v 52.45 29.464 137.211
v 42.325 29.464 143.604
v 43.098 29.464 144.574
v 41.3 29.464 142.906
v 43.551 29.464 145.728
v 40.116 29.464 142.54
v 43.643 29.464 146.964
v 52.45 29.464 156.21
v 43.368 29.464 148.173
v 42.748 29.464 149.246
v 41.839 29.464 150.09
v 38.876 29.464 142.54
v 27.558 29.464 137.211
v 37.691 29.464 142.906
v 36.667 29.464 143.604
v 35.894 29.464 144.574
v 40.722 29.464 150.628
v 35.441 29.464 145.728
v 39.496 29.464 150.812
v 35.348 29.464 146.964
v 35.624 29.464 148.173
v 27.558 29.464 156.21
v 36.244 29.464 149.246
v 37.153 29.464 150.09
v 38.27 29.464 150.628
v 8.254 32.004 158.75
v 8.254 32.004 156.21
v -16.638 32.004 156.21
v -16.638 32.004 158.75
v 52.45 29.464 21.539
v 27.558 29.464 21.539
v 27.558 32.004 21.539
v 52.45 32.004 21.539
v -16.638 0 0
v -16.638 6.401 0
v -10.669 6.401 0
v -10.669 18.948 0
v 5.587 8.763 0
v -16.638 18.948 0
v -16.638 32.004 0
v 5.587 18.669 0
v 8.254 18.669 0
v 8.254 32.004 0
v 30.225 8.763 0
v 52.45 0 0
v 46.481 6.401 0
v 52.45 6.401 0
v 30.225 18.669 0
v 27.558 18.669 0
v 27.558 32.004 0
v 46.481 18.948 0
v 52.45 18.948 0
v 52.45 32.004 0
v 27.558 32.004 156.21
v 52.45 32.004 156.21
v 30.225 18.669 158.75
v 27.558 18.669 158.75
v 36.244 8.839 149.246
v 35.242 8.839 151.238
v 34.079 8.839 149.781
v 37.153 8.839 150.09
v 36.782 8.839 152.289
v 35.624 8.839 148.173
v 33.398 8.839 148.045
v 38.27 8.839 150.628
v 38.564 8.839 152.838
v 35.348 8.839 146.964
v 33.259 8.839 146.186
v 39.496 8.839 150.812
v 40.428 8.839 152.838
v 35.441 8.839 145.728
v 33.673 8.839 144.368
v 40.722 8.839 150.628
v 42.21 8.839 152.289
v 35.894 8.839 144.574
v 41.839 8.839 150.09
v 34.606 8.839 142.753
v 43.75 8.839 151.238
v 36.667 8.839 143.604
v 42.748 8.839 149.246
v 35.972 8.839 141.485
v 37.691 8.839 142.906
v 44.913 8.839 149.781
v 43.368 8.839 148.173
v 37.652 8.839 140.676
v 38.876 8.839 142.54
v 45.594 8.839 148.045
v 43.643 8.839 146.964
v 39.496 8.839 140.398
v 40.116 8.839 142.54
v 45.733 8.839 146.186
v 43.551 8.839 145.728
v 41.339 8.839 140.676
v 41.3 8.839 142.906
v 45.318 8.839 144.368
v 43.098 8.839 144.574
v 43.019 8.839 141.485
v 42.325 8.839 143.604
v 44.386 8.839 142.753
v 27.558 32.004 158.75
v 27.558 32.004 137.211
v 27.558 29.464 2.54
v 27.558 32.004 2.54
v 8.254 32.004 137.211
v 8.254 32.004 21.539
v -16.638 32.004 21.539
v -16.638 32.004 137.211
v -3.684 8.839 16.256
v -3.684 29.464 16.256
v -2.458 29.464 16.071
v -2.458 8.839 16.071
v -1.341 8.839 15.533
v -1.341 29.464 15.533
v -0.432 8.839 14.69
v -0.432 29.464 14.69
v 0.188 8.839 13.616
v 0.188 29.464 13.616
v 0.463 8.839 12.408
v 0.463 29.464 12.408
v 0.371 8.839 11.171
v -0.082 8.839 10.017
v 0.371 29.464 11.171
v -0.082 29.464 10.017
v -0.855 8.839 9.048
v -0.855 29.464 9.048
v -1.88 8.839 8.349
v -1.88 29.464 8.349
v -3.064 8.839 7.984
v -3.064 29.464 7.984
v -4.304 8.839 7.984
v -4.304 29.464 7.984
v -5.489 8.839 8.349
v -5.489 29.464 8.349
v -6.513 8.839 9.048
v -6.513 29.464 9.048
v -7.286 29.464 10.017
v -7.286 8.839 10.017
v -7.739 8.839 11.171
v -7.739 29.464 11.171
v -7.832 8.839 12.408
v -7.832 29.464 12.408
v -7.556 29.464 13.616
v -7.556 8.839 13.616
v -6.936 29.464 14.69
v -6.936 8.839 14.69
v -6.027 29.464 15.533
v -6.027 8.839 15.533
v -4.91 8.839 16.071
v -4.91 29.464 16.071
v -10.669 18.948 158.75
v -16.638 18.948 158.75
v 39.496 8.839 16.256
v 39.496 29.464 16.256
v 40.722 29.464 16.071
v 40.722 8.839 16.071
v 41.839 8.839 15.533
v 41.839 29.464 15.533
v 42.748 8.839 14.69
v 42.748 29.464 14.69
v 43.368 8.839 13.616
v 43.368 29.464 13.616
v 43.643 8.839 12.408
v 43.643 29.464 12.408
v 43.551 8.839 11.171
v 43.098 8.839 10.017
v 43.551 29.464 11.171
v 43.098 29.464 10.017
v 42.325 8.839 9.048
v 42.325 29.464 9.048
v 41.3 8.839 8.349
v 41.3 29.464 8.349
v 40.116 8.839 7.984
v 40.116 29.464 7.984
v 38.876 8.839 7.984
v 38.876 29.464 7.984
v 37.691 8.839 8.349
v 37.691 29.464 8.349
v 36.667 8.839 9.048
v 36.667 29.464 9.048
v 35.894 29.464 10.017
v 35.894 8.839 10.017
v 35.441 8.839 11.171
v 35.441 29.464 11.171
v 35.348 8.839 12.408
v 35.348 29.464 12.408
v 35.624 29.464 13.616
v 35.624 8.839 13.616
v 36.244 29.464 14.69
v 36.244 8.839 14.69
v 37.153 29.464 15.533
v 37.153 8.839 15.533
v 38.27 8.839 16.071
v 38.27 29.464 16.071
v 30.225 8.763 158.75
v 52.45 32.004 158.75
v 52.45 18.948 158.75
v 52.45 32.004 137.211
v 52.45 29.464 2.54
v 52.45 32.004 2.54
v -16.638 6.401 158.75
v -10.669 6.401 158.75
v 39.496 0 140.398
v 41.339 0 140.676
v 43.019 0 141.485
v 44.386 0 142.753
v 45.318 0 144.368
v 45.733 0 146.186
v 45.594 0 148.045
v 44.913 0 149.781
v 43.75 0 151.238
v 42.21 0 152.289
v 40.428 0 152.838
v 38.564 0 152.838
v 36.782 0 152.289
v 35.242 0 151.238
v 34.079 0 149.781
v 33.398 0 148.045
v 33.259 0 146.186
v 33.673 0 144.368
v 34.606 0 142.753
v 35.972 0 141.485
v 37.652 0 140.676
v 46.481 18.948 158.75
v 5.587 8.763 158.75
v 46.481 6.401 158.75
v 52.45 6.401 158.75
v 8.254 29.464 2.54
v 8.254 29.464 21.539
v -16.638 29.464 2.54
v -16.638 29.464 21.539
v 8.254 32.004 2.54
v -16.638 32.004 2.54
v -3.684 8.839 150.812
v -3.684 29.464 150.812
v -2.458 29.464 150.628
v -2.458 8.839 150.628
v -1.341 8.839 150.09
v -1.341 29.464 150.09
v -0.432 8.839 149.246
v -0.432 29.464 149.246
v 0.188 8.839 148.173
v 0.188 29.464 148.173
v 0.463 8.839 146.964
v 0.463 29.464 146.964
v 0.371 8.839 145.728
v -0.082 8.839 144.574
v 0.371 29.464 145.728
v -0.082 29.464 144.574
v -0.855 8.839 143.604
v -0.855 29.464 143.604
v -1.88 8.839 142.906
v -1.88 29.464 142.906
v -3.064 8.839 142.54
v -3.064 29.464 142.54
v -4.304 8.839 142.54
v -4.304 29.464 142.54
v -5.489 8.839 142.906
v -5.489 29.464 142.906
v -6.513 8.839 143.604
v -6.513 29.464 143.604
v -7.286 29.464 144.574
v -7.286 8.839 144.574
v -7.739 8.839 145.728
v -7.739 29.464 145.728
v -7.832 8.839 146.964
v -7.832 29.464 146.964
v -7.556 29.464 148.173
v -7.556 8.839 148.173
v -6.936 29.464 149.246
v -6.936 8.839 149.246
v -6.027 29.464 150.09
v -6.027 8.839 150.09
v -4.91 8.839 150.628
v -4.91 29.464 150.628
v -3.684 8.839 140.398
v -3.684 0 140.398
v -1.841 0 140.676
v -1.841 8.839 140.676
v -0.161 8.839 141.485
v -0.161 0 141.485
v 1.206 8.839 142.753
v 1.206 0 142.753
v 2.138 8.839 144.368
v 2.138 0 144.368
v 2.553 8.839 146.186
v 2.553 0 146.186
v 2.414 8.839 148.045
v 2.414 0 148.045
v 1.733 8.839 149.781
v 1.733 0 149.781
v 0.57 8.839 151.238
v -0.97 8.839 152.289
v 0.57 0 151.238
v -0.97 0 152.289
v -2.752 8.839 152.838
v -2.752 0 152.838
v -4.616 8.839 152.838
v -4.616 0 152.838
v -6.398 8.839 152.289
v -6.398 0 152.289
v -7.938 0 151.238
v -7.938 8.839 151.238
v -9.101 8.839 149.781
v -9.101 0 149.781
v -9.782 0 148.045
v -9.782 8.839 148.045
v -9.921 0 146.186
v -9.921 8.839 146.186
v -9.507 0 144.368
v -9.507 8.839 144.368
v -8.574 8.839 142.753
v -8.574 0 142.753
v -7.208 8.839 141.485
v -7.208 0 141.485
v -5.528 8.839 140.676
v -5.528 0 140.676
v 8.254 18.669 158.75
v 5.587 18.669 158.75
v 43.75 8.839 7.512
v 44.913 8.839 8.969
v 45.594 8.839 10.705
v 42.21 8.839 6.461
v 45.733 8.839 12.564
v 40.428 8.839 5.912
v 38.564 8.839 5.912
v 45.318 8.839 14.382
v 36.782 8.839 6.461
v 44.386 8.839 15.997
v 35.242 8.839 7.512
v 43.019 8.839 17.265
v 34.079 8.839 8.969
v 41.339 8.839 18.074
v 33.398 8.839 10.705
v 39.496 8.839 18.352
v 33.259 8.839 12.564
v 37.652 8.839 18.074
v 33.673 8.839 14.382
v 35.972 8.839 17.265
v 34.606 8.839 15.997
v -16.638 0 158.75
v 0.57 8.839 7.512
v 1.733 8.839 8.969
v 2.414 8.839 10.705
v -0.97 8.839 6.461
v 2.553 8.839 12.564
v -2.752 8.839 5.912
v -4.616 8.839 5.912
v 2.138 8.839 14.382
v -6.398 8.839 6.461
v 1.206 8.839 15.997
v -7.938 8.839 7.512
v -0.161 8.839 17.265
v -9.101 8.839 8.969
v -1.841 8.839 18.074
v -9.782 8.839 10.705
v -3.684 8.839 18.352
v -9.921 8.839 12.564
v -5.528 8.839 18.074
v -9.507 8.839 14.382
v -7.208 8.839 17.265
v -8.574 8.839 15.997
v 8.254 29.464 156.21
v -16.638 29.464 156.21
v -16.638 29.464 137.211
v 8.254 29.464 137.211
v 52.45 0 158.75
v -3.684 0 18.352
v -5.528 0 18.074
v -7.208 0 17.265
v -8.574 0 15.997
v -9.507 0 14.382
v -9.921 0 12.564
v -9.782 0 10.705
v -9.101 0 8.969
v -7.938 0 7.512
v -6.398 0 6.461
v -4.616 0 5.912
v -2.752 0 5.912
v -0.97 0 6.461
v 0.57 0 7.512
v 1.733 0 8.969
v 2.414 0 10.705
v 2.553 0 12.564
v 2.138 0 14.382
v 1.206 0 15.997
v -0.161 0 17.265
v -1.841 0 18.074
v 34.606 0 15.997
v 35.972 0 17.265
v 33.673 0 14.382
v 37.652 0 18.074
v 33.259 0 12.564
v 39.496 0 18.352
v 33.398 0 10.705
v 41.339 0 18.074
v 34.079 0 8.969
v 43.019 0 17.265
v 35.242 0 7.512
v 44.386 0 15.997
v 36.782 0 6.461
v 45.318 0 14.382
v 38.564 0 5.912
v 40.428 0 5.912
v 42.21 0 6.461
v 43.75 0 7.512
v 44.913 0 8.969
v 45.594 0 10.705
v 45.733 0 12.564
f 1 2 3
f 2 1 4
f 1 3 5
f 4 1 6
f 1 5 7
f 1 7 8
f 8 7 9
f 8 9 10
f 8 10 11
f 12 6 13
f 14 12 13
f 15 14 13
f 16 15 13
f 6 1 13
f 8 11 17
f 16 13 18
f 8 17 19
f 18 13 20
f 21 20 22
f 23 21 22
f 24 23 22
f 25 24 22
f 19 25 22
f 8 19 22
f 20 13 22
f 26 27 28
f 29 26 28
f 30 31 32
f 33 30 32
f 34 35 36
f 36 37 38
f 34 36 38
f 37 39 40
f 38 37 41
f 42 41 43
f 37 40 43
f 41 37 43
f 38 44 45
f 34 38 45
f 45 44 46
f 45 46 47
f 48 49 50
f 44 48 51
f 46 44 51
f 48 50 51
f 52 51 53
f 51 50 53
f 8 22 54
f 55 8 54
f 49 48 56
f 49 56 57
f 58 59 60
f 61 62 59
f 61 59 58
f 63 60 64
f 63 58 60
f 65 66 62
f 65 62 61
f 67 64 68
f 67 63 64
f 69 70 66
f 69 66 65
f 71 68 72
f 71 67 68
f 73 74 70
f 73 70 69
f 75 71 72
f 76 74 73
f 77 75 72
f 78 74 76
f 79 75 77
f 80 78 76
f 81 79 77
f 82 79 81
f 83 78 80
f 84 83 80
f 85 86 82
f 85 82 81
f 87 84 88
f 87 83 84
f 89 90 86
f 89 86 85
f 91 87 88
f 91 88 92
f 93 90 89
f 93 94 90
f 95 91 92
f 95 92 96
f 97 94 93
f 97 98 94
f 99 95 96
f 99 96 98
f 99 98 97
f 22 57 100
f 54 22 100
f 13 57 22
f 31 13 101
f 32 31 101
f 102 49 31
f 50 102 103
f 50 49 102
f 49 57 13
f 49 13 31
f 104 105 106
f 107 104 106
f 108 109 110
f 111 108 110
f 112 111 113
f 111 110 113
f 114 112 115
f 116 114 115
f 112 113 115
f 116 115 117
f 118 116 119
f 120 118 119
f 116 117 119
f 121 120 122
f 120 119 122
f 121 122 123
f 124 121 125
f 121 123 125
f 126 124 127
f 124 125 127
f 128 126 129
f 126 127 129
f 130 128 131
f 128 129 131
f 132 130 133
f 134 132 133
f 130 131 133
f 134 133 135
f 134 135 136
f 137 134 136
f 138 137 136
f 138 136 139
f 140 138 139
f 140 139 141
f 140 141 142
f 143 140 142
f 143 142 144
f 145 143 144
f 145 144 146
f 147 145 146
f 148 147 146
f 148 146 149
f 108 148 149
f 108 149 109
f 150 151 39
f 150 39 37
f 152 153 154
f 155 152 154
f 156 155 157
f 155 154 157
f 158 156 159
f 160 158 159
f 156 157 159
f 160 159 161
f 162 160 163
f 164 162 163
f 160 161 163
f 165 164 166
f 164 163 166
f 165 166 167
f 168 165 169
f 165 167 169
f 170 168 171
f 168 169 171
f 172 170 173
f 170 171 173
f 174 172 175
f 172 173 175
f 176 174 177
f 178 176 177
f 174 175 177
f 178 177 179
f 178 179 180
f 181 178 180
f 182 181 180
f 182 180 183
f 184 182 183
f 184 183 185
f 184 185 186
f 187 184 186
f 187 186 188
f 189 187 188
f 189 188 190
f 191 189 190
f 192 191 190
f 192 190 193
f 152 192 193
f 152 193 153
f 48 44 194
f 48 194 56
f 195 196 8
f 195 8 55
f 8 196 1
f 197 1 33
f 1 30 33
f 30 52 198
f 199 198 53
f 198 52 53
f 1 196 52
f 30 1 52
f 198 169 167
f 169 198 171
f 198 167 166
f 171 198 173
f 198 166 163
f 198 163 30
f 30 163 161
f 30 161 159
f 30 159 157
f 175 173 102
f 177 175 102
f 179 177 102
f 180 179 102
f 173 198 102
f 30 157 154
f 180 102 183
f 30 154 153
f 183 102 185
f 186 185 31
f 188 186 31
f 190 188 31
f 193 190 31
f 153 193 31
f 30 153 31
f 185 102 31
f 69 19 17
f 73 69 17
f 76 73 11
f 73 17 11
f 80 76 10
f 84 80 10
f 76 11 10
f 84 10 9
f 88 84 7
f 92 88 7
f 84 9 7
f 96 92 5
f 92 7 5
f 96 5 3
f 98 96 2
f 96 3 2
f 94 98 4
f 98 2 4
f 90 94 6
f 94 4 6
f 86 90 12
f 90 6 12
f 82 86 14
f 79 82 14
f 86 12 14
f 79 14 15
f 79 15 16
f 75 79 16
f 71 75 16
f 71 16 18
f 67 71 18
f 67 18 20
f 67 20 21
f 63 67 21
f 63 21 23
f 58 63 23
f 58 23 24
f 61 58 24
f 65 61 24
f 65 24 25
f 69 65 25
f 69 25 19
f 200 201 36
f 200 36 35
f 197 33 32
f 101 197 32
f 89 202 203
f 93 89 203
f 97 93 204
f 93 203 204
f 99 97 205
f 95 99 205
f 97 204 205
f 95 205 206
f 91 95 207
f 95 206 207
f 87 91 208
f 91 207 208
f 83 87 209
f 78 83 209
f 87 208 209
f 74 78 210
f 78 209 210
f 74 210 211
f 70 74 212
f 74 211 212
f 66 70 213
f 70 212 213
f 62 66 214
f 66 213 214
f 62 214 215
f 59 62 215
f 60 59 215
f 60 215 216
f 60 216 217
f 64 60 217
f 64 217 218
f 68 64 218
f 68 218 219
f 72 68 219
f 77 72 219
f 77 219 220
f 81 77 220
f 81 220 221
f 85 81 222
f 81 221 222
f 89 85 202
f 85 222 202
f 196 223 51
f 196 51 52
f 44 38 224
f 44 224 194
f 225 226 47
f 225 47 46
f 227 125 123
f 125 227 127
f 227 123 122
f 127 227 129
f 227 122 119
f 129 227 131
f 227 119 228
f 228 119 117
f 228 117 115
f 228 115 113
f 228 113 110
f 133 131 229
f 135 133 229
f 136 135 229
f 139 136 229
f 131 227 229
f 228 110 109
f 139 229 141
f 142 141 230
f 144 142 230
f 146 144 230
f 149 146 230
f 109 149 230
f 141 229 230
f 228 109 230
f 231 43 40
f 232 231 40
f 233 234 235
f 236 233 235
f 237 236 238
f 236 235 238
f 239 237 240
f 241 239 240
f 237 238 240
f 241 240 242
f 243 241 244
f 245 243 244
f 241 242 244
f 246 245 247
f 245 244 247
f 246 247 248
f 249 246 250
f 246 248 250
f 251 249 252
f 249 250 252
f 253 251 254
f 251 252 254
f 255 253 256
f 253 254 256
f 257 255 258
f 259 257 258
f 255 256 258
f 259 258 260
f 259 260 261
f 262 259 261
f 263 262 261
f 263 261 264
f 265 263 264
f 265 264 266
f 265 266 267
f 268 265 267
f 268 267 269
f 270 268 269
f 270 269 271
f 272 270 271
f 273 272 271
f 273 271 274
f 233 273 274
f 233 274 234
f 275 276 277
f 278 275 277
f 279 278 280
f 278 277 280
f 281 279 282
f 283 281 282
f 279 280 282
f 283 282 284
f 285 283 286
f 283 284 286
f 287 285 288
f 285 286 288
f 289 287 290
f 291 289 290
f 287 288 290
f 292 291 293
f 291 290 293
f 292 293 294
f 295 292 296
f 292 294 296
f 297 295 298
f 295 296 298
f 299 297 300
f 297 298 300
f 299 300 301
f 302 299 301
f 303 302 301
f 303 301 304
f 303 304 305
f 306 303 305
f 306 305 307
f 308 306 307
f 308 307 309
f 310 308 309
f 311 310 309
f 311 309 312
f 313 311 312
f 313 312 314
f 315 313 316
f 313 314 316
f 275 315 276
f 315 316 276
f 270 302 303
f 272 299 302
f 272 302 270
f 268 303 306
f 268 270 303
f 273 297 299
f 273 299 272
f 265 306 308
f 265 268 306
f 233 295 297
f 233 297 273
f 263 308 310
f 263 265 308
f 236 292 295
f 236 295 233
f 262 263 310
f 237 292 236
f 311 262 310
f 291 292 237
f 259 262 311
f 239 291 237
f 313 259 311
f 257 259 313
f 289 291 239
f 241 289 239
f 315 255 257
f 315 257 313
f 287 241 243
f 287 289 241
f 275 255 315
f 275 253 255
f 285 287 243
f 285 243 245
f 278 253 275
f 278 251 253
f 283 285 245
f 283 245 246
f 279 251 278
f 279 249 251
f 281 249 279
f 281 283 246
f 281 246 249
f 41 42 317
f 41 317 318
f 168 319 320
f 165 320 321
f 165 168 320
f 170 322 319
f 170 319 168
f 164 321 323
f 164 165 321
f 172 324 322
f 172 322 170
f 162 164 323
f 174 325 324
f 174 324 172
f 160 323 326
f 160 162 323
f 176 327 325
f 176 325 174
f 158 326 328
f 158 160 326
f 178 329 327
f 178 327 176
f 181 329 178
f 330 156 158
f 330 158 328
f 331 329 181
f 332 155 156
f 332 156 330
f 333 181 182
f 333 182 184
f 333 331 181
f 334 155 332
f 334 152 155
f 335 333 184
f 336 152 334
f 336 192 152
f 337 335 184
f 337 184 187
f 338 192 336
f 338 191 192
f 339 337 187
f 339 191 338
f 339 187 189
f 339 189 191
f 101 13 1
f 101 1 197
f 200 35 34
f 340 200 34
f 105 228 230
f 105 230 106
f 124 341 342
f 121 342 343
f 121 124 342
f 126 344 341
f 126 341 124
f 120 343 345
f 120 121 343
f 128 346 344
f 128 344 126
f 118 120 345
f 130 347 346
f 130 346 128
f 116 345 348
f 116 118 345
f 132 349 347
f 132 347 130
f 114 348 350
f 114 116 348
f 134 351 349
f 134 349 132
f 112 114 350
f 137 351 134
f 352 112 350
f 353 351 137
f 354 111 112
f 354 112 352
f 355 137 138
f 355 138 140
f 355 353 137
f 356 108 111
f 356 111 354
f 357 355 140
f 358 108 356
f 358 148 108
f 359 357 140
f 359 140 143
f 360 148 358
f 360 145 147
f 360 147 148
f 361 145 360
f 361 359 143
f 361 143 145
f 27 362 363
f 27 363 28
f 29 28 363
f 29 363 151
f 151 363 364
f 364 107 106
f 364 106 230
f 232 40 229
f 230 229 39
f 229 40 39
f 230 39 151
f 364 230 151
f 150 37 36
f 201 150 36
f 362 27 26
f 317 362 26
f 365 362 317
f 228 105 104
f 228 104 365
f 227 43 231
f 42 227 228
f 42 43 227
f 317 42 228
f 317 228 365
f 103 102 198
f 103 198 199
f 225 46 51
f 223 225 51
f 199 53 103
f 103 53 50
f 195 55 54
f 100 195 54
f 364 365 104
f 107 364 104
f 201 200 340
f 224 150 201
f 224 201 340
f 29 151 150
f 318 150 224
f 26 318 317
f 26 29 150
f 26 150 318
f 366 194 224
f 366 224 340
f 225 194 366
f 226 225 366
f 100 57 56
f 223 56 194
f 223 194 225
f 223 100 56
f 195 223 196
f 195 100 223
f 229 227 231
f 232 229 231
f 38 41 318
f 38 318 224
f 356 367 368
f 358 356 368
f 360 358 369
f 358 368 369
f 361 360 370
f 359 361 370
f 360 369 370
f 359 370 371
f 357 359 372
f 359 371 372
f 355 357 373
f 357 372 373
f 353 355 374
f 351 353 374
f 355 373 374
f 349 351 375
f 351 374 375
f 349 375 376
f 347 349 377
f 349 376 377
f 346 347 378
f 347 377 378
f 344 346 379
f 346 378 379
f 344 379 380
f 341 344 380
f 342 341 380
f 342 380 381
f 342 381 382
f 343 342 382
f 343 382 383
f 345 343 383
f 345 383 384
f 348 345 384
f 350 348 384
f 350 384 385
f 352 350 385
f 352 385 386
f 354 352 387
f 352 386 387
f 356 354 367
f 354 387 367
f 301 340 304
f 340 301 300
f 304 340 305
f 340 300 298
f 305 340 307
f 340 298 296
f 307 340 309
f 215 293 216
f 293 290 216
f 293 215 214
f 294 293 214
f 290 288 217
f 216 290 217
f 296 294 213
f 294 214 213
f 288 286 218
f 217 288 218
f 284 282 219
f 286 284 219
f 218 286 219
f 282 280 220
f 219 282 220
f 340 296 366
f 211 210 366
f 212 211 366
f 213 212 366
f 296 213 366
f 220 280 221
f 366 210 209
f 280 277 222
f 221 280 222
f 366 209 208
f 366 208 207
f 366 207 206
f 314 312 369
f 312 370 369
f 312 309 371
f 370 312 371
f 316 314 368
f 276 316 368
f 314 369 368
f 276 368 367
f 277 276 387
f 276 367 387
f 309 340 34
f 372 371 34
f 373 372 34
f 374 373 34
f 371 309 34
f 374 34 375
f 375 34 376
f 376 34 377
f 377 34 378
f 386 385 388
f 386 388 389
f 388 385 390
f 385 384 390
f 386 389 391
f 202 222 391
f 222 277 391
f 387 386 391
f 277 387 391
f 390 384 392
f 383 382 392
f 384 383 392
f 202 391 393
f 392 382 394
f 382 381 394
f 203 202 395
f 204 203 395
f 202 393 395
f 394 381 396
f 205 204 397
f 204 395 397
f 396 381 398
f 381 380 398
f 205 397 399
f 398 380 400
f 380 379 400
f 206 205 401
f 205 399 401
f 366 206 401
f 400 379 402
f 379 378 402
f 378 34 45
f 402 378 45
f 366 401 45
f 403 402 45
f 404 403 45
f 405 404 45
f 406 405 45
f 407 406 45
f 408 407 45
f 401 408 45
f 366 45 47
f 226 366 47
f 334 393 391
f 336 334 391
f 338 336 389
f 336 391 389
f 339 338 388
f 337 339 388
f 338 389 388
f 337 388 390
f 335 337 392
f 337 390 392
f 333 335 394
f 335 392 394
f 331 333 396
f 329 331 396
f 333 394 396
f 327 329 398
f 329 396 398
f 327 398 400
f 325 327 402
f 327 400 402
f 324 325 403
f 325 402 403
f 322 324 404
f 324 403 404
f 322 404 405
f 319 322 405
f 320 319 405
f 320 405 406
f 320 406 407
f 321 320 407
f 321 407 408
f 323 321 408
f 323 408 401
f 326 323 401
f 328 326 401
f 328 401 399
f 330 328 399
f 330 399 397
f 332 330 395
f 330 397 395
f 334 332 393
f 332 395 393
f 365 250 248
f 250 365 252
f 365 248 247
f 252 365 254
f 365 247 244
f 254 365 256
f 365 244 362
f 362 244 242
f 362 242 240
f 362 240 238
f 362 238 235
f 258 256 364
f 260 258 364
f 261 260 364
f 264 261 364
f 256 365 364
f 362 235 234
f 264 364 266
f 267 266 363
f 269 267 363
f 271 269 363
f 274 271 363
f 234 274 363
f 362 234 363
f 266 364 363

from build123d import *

# Parameters (mm, degrees)
EXTRUDE1_DEPTH     = 158.75
SKETCH2_W          = 18.9992
SKETCH2_H          = 9.56647298
CUT_EXTRUDE1_DEPTH = 158.75
SKETCH3_R          = 4.15925
CUT_EXTRUDE2_DEPTH = 158.75
SKETCH4_R          = 6.25475
CUT_EXTRUDE3_DEPTH = 8.8392
EXTRUDE2_REACH     = 172.226


with BuildPart() as part:
    # Sketch1 → Extrude1 (new body)
    with BuildSketch(Plane.XY):
        Polygon((-16.638134778, 6.4008), (-16.638134778, 0), (52.449865222, 0), (52.449865222, 6.4008), (46.480865222, 6.4008), (46.480865222, 18.9484), (52.449865222, 18.9484), (52.449865222, 32.004), (-16.638134778, 32.004), (-16.638134778, 18.9484), (-10.669134778, 18.9484), (-10.669134778, 6.4008), align=None)
    extrude(amount=EXTRUDE1_DEPTH)

    # Sketch2 → Cut-Extrude1 (cut)
    with BuildSketch(Plane.ZY.offset(16.638134778)):
        with Locations((12.0396, 34.24723649)):
            Rectangle(SKETCH2_W, SKETCH2_H)
        with Locations((146.7104, 34.24723649)):
            Rectangle(SKETCH2_W, SKETCH2_H)
    extrude(amount=-CUT_EXTRUDE1_DEPTH, mode=Mode.SUBTRACT)

    # Sketch3 → Cut-Extrude2 (cut)
    with BuildSketch(Plane(origin=(0, 29.464, 0), x_dir=(-1, 0, 0), z_dir=(0, 1, 0))):
        with Locations(Location((3.684134778, 12.09675, 0), (0, 0, 90))):
            Circle(SKETCH3_R)
        with Locations(Location((-39.495865222, 12.09675, 0), (0, 0, 90))):
            Circle(SKETCH3_R)
        with Locations(Location((-39.495865222, 146.65325, 0), (0, 0, 90))):
            Circle(SKETCH3_R)
        with Locations(Location((3.684134778, 146.65325, 0), (0, 0, 90))):
            Circle(SKETCH3_R)
    extrude(amount=-CUT_EXTRUDE2_DEPTH, mode=Mode.SUBTRACT)

    # Sketch4 → Cut-Extrude3 (cut)
    with BuildSketch(Plane.XZ):
        with Locations(Location((-3.684134778, 146.65325, 0), (0, 0, 270))):
            Circle(SKETCH4_R)
        with Locations(Location((39.495865222, 146.65325, 0), (0, 0, 270))):
            Circle(SKETCH4_R)
        with Locations(Location((39.495865222, 12.09675, 0), (0, 0, 90))):
            Circle(SKETCH4_R)
        with Locations(Location((-3.684134778, 12.09675, 0), (0, 0, 90))):
            Circle(SKETCH4_R)
    extrude(amount=-CUT_EXTRUDE3_DEPTH, mode=Mode.SUBTRACT)

    # Sketch5 → Extrude2 (cut, up to next)
    with BuildSketch(Plane.XY, mode=Mode.PRIVATE) as extrude2_sk1:
        Polygon((8.253865222, 18.669), (5.586865222, 18.669), (5.586865222, 8.763), (30.224865222, 8.763), (30.224865222, 18.669), (27.557865222, 18.669), (27.557865222, 32.004), (8.253865222, 32.004), align=None)
    extrude2_tool1 = extrude(extrude2_sk1.sketch, amount=EXTRUDE2_REACH, mode=Mode.PRIVATE) & part.part
    add(extrude2_tool1.solids().sort_by_distance((17.905865, 19.680981, 0))[0], mode=Mode.SUBTRACT)


solid = part.part
